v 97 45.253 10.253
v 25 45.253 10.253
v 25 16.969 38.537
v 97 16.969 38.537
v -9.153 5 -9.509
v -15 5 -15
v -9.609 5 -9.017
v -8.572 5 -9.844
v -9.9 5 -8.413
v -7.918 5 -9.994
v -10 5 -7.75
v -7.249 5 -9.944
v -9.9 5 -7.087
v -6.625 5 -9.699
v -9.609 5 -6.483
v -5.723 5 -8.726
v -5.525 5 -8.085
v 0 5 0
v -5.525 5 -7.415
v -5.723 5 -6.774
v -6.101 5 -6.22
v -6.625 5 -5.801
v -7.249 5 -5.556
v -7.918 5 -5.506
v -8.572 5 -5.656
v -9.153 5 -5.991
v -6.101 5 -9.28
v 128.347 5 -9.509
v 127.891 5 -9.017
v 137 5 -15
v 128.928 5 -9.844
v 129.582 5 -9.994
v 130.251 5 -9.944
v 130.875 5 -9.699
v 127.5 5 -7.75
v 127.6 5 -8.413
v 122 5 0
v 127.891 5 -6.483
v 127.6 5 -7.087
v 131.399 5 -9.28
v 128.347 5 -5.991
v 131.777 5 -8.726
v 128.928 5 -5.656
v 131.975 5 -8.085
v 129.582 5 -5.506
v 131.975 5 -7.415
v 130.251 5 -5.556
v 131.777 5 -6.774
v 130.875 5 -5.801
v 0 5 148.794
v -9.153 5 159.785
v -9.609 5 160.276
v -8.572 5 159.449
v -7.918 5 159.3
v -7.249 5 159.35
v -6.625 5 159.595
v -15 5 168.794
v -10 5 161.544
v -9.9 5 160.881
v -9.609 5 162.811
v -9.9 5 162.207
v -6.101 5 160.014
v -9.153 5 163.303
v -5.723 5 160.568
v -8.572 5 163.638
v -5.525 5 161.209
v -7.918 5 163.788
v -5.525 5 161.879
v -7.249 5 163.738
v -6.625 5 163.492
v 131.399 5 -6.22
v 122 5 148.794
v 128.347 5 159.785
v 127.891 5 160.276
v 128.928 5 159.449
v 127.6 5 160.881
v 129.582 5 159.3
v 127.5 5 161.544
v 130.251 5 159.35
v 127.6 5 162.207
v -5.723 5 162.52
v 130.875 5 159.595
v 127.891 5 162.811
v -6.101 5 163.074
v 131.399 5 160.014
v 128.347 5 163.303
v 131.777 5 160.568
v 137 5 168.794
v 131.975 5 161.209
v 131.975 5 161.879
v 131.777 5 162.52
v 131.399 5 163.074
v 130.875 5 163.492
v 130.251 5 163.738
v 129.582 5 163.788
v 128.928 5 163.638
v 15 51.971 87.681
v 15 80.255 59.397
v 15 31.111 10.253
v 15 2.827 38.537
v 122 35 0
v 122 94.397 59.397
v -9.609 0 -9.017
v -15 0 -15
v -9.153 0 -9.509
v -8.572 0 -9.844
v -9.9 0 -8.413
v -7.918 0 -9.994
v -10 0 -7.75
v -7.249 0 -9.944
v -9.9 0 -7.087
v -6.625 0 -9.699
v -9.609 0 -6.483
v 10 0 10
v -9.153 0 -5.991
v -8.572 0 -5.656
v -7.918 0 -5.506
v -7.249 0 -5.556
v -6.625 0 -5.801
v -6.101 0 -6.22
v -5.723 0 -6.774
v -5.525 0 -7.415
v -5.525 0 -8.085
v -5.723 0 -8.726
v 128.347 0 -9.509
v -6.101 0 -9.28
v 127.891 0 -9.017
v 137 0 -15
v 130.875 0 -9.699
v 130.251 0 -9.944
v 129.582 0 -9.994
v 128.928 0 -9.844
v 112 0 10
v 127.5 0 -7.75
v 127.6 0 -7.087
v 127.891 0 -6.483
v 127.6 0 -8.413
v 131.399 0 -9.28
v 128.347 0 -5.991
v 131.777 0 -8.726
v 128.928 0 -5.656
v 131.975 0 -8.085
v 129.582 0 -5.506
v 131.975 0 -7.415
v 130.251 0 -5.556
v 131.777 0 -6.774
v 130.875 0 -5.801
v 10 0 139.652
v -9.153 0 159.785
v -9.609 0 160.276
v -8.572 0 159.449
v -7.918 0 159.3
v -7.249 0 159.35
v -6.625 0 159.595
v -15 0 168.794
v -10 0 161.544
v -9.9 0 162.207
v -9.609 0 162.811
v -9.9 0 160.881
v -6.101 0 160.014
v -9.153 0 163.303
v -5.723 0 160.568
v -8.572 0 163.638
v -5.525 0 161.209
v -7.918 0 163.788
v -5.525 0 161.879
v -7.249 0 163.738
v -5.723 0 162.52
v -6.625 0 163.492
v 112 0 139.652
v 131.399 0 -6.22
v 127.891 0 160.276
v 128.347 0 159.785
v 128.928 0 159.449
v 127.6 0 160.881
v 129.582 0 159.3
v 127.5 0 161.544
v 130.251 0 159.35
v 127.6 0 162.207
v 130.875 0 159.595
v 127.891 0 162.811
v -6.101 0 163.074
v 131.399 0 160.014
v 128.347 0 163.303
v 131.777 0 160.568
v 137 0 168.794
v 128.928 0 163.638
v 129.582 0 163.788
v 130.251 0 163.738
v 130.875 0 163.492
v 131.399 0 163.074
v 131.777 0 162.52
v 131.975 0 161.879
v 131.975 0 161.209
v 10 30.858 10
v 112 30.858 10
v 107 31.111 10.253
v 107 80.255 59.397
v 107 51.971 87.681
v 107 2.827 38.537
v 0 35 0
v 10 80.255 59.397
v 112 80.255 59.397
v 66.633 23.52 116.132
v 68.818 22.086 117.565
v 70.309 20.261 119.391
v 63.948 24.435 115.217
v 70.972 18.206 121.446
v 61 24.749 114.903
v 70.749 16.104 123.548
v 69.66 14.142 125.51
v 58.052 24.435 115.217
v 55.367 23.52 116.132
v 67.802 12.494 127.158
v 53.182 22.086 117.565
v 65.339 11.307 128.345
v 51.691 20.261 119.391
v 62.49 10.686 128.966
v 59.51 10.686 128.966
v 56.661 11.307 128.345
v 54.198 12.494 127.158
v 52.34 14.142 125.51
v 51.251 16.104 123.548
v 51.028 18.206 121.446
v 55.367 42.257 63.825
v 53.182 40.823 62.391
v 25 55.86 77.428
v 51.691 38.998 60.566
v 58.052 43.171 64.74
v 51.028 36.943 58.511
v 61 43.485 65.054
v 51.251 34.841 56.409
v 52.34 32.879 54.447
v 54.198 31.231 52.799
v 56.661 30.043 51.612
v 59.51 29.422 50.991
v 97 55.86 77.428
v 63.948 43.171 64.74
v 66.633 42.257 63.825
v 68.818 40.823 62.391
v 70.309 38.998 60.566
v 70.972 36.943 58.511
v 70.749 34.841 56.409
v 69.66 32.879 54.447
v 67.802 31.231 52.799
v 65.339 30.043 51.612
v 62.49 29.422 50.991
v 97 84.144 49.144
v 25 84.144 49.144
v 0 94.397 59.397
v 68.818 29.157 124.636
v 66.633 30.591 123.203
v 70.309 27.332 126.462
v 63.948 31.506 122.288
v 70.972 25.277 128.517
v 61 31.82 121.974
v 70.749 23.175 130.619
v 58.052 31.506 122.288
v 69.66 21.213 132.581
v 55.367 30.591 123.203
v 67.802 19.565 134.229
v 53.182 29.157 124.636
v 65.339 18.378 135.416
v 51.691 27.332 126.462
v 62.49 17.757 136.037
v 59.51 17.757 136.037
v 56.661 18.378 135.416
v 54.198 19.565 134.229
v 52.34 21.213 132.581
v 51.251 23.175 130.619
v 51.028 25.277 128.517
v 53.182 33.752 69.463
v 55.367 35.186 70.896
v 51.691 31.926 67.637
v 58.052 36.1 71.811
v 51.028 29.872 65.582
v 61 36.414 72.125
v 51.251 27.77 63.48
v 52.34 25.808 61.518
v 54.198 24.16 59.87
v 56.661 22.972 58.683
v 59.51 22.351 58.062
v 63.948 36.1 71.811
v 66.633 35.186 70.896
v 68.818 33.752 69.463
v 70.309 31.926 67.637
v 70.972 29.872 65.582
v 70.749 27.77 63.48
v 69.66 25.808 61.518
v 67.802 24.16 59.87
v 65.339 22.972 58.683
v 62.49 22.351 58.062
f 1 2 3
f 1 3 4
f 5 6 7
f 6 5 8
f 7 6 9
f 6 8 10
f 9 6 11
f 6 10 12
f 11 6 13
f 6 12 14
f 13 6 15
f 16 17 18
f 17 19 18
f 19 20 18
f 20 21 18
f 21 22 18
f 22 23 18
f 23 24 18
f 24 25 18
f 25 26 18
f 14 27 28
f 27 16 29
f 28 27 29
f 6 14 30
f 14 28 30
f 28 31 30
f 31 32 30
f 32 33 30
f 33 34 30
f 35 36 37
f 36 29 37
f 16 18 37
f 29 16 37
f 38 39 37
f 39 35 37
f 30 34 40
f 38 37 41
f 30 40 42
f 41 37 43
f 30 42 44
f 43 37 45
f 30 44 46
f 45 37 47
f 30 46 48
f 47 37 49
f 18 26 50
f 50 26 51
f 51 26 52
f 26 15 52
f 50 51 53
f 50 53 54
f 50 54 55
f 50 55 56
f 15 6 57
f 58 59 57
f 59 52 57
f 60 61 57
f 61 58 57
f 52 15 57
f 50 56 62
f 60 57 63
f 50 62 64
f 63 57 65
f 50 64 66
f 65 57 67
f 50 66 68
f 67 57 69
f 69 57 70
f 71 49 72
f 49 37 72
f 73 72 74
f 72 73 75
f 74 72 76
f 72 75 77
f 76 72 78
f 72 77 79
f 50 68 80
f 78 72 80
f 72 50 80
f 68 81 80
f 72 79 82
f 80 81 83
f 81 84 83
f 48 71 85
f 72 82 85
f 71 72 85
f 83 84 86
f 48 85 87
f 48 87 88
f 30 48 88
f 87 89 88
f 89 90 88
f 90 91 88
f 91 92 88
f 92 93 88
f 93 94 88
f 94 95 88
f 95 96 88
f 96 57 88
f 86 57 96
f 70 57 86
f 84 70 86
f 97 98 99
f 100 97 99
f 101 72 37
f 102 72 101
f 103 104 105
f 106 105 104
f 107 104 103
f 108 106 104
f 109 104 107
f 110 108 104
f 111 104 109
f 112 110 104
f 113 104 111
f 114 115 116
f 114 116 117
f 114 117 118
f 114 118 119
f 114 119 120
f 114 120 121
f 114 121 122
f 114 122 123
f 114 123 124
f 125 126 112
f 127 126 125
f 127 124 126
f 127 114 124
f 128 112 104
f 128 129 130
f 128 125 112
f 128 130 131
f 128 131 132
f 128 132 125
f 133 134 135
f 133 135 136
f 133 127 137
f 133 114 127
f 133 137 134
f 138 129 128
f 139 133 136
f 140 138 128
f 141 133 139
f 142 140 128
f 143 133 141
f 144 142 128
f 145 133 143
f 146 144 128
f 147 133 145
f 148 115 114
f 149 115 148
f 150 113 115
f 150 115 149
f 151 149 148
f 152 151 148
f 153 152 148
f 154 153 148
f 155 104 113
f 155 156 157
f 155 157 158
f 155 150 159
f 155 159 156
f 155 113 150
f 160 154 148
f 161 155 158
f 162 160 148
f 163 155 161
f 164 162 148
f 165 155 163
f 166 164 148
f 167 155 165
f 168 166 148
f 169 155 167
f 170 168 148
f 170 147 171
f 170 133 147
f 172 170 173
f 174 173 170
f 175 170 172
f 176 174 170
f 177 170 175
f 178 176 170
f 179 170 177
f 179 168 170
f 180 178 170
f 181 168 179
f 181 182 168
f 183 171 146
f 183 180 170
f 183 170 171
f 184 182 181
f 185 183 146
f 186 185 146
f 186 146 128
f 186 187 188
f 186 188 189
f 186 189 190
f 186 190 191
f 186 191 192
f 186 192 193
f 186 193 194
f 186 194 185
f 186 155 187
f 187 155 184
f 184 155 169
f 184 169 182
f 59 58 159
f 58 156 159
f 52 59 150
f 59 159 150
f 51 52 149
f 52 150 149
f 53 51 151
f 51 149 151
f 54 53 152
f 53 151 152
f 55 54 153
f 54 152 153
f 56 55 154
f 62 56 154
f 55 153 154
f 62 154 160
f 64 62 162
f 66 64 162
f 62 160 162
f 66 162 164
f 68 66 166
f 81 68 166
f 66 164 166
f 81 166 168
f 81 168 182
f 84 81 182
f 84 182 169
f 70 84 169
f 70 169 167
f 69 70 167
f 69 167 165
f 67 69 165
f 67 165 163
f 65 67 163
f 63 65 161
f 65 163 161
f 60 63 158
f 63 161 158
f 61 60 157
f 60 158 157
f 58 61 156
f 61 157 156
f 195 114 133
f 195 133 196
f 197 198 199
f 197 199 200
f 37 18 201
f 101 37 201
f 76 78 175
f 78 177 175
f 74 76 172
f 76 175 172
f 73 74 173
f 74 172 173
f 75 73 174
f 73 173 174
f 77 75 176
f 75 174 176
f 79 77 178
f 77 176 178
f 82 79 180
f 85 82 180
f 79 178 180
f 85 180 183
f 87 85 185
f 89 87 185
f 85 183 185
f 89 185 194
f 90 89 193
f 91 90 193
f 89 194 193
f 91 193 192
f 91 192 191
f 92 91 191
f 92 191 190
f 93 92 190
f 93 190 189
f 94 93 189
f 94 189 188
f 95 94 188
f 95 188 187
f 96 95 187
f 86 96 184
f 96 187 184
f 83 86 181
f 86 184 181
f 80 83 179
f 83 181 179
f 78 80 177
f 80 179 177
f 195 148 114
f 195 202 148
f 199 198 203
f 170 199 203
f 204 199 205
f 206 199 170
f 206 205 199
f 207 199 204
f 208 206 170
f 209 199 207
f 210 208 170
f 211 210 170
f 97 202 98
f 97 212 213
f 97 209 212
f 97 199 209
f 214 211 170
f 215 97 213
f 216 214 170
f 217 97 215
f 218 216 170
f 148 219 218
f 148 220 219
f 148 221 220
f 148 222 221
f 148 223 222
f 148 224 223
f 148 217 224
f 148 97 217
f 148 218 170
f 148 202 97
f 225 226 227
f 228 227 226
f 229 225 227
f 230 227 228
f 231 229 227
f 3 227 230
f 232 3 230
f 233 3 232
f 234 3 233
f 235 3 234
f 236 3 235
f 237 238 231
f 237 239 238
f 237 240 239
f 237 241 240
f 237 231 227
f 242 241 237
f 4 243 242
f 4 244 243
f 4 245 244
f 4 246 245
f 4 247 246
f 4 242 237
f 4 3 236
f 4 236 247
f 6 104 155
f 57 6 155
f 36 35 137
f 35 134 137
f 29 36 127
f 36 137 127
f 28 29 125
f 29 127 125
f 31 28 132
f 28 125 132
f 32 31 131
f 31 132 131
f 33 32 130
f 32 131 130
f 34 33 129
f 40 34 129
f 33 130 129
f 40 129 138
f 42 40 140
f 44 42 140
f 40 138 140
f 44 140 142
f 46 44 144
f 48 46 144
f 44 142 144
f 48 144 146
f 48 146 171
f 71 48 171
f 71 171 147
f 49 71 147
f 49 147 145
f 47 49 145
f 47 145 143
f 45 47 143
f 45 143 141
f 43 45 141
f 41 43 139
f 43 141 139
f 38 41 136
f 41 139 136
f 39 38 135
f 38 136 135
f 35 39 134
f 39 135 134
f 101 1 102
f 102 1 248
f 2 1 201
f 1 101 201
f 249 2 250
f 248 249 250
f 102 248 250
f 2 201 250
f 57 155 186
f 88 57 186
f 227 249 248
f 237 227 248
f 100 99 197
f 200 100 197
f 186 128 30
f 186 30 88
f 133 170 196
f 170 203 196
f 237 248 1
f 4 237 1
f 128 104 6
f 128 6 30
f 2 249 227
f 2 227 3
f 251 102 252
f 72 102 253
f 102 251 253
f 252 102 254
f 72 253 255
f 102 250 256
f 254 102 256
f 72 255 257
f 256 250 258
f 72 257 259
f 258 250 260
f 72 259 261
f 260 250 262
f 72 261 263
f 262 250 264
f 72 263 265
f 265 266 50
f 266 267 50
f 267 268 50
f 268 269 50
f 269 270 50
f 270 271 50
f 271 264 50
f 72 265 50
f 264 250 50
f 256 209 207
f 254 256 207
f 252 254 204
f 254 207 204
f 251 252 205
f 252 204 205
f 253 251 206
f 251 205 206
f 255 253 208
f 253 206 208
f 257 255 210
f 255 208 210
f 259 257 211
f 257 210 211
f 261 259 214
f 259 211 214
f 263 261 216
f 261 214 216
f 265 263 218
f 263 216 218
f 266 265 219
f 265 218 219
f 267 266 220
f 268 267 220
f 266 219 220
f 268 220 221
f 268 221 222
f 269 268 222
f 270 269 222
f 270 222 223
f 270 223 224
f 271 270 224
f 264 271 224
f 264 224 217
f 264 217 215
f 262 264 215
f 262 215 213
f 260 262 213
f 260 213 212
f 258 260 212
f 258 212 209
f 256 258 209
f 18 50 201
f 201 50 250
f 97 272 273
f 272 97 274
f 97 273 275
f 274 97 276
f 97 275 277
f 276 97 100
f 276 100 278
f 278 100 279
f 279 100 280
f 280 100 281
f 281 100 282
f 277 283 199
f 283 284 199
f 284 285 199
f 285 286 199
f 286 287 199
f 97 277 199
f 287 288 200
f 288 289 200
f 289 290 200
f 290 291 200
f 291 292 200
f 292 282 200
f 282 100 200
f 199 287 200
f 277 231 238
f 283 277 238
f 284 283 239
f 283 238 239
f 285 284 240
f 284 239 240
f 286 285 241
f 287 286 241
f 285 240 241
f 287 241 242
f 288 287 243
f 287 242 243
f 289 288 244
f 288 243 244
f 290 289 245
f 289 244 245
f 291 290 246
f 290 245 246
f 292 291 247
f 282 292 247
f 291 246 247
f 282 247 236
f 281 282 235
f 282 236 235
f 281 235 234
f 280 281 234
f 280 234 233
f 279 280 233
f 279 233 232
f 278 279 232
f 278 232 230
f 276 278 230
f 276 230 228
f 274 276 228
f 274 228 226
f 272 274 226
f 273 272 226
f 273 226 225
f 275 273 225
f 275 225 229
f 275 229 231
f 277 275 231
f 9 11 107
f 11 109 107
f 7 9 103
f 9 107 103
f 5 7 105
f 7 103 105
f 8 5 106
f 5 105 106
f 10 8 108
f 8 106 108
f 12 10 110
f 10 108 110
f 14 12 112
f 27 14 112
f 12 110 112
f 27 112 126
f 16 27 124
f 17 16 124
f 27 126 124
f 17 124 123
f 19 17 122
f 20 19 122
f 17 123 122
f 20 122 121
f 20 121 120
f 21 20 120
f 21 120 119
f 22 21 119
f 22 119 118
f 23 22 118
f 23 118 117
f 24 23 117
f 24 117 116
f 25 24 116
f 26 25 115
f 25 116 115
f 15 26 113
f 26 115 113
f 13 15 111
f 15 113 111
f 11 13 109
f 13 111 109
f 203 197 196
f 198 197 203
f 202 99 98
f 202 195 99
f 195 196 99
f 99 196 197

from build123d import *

# Parameters (mm, degrees)
ESTRUSIONE_ESTRUSIONE1_DEPTH = 122
SCHIZZO2_W                   = 72
SCHIZZO2_H                   = 55
TAGLIO_ESTRUSIONE1_DEPTH     = 40
SVUOTA1_T                    = -10
SCHIZZO3_R                   = 10
TAGLIO_ESTRUSIONE2_DEPTH     = 40
SCHIZZO4_R                   = 10
TAGLIO_ESTRUSIONE3_DEPTH     = 40
SCHIZZO5_W                   = 152
SCHIZZO5_H                   = 183.793939239
SCHIZZO5_W_2                 = 112
SCHIZZO5_H_2                 = 139.651803616
ESTRUSIONE_ESTRUSIONE2_DEPTH = 5
FORO_PER_VITE_M4_1_D         = 4.5
FORO_PER_VITE_M4_1_DEPTH     = 5
FORO_PER_VITE_M4_1_TIP       = 1.351936393


with BuildPart() as part:
    # Schizzo1 → Estrusione-Estrusione1 (new body)
    with BuildSketch(Plane(origin=(0, 0, 0), x_dir=(0, 0, -1), z_dir=(1, 0, 0))):
        Polygon((0, 0), (0, 35), (-59.39696962, 94.39696962), (-153.793939239, 0), align=None)
    extrude(amount=ESTRUSIONE_ESTRUSIONE1_DEPTH)

    # Schizzo2 → Taglio-Estrusione1 (cut)
    with BuildSketch(Plane(origin=(0, 17.5, -17.5), x_dir=(1, 0, 0), z_dir=(0, 0.7071067811865489, -0.7071067811865461))):
        with Locations((61, -66.748737342)):
            Rectangle(SCHIZZO2_W, SCHIZZO2_H)
    extrude(amount=-TAGLIO_ESTRUSIONE1_DEPTH, mode=Mode.SUBTRACT)

    # Svuota1
    svuota1_openings = [part.faces().sort_by_distance(p)[0] for p in [
        (61, 0, 76.89696962),
    ]]
    offset(amount=SVUOTA1_T, openings=svuota1_openings, kind=Kind.INTERSECTION)

    # Schizzo3 → Taglio-Estrusione2 (cut)
    with BuildSketch(Plane(origin=(0, -10.784271247, 10.784271247), x_dir=(1, 0, 0), z_dir=(0, 0.7071067811865489, -0.7071067811865462))):
        with Locations(Location((61, -66.748737342, 0), (0, 0, 270))):
            Circle(SCHIZZO3_R)
    extrude(amount=-TAGLIO_ESTRUSIONE2_DEPTH, mode=Mode.SUBTRACT)

    # Schizzo4 → Taglio-Estrusione3 (cut)
    with BuildSketch(Plane(origin=(0, 69.825901808, 69.825901808), x_dir=(1, 0, 0), z_dir=(0, -0.7071067811865461, -0.707106781186549))):
        with Locations(Location((61, 73.748737342, 0), (0, 0, 270))):
            Circle(SCHIZZO4_R)
    extrude(amount=-TAGLIO_ESTRUSIONE3_DEPTH, mode=Mode.SUBTRACT)

    # Schizzo5 → Estrusione-Estrusione2 (add)
    with BuildSketch(Plane.XZ):
        with Locations((61, 76.896969619)):
            Rectangle(SCHIZZO5_W, SCHIZZO5_H)
        with Locations((66, 69.825901808)):
            Rectangle(SCHIZZO5_W_2, SCHIZZO5_H_2, mode=Mode.SUBTRACT)
    extrude(amount=-ESTRUSIONE_ESTRUSIONE2_DEPTH)

    # Foro per Vite M4-1
    with Locations(Plane(origin=(0, 5, 0), x_dir=(1, 0, 0), z_dir=(0, 1, 0))):
        with Locations((-7.75, -161.543939239), (129.75, -161.543939239), (129.75, 7.75), (-7.75, 7.75)):
            Hole(FORO_PER_VITE_M4_1_D / 2, depth=FORO_PER_VITE_M4_1_DEPTH)
            with Locations((0, 0, -(FORO_PER_VITE_M4_1_DEPTH + FORO_PER_VITE_M4_1_TIP / 2))):  # 118° drill point
                Cone(0, FORO_PER_VITE_M4_1_D / 2, FORO_PER_VITE_M4_1_TIP, mode=Mode.SUBTRACT)


solid = part.part
